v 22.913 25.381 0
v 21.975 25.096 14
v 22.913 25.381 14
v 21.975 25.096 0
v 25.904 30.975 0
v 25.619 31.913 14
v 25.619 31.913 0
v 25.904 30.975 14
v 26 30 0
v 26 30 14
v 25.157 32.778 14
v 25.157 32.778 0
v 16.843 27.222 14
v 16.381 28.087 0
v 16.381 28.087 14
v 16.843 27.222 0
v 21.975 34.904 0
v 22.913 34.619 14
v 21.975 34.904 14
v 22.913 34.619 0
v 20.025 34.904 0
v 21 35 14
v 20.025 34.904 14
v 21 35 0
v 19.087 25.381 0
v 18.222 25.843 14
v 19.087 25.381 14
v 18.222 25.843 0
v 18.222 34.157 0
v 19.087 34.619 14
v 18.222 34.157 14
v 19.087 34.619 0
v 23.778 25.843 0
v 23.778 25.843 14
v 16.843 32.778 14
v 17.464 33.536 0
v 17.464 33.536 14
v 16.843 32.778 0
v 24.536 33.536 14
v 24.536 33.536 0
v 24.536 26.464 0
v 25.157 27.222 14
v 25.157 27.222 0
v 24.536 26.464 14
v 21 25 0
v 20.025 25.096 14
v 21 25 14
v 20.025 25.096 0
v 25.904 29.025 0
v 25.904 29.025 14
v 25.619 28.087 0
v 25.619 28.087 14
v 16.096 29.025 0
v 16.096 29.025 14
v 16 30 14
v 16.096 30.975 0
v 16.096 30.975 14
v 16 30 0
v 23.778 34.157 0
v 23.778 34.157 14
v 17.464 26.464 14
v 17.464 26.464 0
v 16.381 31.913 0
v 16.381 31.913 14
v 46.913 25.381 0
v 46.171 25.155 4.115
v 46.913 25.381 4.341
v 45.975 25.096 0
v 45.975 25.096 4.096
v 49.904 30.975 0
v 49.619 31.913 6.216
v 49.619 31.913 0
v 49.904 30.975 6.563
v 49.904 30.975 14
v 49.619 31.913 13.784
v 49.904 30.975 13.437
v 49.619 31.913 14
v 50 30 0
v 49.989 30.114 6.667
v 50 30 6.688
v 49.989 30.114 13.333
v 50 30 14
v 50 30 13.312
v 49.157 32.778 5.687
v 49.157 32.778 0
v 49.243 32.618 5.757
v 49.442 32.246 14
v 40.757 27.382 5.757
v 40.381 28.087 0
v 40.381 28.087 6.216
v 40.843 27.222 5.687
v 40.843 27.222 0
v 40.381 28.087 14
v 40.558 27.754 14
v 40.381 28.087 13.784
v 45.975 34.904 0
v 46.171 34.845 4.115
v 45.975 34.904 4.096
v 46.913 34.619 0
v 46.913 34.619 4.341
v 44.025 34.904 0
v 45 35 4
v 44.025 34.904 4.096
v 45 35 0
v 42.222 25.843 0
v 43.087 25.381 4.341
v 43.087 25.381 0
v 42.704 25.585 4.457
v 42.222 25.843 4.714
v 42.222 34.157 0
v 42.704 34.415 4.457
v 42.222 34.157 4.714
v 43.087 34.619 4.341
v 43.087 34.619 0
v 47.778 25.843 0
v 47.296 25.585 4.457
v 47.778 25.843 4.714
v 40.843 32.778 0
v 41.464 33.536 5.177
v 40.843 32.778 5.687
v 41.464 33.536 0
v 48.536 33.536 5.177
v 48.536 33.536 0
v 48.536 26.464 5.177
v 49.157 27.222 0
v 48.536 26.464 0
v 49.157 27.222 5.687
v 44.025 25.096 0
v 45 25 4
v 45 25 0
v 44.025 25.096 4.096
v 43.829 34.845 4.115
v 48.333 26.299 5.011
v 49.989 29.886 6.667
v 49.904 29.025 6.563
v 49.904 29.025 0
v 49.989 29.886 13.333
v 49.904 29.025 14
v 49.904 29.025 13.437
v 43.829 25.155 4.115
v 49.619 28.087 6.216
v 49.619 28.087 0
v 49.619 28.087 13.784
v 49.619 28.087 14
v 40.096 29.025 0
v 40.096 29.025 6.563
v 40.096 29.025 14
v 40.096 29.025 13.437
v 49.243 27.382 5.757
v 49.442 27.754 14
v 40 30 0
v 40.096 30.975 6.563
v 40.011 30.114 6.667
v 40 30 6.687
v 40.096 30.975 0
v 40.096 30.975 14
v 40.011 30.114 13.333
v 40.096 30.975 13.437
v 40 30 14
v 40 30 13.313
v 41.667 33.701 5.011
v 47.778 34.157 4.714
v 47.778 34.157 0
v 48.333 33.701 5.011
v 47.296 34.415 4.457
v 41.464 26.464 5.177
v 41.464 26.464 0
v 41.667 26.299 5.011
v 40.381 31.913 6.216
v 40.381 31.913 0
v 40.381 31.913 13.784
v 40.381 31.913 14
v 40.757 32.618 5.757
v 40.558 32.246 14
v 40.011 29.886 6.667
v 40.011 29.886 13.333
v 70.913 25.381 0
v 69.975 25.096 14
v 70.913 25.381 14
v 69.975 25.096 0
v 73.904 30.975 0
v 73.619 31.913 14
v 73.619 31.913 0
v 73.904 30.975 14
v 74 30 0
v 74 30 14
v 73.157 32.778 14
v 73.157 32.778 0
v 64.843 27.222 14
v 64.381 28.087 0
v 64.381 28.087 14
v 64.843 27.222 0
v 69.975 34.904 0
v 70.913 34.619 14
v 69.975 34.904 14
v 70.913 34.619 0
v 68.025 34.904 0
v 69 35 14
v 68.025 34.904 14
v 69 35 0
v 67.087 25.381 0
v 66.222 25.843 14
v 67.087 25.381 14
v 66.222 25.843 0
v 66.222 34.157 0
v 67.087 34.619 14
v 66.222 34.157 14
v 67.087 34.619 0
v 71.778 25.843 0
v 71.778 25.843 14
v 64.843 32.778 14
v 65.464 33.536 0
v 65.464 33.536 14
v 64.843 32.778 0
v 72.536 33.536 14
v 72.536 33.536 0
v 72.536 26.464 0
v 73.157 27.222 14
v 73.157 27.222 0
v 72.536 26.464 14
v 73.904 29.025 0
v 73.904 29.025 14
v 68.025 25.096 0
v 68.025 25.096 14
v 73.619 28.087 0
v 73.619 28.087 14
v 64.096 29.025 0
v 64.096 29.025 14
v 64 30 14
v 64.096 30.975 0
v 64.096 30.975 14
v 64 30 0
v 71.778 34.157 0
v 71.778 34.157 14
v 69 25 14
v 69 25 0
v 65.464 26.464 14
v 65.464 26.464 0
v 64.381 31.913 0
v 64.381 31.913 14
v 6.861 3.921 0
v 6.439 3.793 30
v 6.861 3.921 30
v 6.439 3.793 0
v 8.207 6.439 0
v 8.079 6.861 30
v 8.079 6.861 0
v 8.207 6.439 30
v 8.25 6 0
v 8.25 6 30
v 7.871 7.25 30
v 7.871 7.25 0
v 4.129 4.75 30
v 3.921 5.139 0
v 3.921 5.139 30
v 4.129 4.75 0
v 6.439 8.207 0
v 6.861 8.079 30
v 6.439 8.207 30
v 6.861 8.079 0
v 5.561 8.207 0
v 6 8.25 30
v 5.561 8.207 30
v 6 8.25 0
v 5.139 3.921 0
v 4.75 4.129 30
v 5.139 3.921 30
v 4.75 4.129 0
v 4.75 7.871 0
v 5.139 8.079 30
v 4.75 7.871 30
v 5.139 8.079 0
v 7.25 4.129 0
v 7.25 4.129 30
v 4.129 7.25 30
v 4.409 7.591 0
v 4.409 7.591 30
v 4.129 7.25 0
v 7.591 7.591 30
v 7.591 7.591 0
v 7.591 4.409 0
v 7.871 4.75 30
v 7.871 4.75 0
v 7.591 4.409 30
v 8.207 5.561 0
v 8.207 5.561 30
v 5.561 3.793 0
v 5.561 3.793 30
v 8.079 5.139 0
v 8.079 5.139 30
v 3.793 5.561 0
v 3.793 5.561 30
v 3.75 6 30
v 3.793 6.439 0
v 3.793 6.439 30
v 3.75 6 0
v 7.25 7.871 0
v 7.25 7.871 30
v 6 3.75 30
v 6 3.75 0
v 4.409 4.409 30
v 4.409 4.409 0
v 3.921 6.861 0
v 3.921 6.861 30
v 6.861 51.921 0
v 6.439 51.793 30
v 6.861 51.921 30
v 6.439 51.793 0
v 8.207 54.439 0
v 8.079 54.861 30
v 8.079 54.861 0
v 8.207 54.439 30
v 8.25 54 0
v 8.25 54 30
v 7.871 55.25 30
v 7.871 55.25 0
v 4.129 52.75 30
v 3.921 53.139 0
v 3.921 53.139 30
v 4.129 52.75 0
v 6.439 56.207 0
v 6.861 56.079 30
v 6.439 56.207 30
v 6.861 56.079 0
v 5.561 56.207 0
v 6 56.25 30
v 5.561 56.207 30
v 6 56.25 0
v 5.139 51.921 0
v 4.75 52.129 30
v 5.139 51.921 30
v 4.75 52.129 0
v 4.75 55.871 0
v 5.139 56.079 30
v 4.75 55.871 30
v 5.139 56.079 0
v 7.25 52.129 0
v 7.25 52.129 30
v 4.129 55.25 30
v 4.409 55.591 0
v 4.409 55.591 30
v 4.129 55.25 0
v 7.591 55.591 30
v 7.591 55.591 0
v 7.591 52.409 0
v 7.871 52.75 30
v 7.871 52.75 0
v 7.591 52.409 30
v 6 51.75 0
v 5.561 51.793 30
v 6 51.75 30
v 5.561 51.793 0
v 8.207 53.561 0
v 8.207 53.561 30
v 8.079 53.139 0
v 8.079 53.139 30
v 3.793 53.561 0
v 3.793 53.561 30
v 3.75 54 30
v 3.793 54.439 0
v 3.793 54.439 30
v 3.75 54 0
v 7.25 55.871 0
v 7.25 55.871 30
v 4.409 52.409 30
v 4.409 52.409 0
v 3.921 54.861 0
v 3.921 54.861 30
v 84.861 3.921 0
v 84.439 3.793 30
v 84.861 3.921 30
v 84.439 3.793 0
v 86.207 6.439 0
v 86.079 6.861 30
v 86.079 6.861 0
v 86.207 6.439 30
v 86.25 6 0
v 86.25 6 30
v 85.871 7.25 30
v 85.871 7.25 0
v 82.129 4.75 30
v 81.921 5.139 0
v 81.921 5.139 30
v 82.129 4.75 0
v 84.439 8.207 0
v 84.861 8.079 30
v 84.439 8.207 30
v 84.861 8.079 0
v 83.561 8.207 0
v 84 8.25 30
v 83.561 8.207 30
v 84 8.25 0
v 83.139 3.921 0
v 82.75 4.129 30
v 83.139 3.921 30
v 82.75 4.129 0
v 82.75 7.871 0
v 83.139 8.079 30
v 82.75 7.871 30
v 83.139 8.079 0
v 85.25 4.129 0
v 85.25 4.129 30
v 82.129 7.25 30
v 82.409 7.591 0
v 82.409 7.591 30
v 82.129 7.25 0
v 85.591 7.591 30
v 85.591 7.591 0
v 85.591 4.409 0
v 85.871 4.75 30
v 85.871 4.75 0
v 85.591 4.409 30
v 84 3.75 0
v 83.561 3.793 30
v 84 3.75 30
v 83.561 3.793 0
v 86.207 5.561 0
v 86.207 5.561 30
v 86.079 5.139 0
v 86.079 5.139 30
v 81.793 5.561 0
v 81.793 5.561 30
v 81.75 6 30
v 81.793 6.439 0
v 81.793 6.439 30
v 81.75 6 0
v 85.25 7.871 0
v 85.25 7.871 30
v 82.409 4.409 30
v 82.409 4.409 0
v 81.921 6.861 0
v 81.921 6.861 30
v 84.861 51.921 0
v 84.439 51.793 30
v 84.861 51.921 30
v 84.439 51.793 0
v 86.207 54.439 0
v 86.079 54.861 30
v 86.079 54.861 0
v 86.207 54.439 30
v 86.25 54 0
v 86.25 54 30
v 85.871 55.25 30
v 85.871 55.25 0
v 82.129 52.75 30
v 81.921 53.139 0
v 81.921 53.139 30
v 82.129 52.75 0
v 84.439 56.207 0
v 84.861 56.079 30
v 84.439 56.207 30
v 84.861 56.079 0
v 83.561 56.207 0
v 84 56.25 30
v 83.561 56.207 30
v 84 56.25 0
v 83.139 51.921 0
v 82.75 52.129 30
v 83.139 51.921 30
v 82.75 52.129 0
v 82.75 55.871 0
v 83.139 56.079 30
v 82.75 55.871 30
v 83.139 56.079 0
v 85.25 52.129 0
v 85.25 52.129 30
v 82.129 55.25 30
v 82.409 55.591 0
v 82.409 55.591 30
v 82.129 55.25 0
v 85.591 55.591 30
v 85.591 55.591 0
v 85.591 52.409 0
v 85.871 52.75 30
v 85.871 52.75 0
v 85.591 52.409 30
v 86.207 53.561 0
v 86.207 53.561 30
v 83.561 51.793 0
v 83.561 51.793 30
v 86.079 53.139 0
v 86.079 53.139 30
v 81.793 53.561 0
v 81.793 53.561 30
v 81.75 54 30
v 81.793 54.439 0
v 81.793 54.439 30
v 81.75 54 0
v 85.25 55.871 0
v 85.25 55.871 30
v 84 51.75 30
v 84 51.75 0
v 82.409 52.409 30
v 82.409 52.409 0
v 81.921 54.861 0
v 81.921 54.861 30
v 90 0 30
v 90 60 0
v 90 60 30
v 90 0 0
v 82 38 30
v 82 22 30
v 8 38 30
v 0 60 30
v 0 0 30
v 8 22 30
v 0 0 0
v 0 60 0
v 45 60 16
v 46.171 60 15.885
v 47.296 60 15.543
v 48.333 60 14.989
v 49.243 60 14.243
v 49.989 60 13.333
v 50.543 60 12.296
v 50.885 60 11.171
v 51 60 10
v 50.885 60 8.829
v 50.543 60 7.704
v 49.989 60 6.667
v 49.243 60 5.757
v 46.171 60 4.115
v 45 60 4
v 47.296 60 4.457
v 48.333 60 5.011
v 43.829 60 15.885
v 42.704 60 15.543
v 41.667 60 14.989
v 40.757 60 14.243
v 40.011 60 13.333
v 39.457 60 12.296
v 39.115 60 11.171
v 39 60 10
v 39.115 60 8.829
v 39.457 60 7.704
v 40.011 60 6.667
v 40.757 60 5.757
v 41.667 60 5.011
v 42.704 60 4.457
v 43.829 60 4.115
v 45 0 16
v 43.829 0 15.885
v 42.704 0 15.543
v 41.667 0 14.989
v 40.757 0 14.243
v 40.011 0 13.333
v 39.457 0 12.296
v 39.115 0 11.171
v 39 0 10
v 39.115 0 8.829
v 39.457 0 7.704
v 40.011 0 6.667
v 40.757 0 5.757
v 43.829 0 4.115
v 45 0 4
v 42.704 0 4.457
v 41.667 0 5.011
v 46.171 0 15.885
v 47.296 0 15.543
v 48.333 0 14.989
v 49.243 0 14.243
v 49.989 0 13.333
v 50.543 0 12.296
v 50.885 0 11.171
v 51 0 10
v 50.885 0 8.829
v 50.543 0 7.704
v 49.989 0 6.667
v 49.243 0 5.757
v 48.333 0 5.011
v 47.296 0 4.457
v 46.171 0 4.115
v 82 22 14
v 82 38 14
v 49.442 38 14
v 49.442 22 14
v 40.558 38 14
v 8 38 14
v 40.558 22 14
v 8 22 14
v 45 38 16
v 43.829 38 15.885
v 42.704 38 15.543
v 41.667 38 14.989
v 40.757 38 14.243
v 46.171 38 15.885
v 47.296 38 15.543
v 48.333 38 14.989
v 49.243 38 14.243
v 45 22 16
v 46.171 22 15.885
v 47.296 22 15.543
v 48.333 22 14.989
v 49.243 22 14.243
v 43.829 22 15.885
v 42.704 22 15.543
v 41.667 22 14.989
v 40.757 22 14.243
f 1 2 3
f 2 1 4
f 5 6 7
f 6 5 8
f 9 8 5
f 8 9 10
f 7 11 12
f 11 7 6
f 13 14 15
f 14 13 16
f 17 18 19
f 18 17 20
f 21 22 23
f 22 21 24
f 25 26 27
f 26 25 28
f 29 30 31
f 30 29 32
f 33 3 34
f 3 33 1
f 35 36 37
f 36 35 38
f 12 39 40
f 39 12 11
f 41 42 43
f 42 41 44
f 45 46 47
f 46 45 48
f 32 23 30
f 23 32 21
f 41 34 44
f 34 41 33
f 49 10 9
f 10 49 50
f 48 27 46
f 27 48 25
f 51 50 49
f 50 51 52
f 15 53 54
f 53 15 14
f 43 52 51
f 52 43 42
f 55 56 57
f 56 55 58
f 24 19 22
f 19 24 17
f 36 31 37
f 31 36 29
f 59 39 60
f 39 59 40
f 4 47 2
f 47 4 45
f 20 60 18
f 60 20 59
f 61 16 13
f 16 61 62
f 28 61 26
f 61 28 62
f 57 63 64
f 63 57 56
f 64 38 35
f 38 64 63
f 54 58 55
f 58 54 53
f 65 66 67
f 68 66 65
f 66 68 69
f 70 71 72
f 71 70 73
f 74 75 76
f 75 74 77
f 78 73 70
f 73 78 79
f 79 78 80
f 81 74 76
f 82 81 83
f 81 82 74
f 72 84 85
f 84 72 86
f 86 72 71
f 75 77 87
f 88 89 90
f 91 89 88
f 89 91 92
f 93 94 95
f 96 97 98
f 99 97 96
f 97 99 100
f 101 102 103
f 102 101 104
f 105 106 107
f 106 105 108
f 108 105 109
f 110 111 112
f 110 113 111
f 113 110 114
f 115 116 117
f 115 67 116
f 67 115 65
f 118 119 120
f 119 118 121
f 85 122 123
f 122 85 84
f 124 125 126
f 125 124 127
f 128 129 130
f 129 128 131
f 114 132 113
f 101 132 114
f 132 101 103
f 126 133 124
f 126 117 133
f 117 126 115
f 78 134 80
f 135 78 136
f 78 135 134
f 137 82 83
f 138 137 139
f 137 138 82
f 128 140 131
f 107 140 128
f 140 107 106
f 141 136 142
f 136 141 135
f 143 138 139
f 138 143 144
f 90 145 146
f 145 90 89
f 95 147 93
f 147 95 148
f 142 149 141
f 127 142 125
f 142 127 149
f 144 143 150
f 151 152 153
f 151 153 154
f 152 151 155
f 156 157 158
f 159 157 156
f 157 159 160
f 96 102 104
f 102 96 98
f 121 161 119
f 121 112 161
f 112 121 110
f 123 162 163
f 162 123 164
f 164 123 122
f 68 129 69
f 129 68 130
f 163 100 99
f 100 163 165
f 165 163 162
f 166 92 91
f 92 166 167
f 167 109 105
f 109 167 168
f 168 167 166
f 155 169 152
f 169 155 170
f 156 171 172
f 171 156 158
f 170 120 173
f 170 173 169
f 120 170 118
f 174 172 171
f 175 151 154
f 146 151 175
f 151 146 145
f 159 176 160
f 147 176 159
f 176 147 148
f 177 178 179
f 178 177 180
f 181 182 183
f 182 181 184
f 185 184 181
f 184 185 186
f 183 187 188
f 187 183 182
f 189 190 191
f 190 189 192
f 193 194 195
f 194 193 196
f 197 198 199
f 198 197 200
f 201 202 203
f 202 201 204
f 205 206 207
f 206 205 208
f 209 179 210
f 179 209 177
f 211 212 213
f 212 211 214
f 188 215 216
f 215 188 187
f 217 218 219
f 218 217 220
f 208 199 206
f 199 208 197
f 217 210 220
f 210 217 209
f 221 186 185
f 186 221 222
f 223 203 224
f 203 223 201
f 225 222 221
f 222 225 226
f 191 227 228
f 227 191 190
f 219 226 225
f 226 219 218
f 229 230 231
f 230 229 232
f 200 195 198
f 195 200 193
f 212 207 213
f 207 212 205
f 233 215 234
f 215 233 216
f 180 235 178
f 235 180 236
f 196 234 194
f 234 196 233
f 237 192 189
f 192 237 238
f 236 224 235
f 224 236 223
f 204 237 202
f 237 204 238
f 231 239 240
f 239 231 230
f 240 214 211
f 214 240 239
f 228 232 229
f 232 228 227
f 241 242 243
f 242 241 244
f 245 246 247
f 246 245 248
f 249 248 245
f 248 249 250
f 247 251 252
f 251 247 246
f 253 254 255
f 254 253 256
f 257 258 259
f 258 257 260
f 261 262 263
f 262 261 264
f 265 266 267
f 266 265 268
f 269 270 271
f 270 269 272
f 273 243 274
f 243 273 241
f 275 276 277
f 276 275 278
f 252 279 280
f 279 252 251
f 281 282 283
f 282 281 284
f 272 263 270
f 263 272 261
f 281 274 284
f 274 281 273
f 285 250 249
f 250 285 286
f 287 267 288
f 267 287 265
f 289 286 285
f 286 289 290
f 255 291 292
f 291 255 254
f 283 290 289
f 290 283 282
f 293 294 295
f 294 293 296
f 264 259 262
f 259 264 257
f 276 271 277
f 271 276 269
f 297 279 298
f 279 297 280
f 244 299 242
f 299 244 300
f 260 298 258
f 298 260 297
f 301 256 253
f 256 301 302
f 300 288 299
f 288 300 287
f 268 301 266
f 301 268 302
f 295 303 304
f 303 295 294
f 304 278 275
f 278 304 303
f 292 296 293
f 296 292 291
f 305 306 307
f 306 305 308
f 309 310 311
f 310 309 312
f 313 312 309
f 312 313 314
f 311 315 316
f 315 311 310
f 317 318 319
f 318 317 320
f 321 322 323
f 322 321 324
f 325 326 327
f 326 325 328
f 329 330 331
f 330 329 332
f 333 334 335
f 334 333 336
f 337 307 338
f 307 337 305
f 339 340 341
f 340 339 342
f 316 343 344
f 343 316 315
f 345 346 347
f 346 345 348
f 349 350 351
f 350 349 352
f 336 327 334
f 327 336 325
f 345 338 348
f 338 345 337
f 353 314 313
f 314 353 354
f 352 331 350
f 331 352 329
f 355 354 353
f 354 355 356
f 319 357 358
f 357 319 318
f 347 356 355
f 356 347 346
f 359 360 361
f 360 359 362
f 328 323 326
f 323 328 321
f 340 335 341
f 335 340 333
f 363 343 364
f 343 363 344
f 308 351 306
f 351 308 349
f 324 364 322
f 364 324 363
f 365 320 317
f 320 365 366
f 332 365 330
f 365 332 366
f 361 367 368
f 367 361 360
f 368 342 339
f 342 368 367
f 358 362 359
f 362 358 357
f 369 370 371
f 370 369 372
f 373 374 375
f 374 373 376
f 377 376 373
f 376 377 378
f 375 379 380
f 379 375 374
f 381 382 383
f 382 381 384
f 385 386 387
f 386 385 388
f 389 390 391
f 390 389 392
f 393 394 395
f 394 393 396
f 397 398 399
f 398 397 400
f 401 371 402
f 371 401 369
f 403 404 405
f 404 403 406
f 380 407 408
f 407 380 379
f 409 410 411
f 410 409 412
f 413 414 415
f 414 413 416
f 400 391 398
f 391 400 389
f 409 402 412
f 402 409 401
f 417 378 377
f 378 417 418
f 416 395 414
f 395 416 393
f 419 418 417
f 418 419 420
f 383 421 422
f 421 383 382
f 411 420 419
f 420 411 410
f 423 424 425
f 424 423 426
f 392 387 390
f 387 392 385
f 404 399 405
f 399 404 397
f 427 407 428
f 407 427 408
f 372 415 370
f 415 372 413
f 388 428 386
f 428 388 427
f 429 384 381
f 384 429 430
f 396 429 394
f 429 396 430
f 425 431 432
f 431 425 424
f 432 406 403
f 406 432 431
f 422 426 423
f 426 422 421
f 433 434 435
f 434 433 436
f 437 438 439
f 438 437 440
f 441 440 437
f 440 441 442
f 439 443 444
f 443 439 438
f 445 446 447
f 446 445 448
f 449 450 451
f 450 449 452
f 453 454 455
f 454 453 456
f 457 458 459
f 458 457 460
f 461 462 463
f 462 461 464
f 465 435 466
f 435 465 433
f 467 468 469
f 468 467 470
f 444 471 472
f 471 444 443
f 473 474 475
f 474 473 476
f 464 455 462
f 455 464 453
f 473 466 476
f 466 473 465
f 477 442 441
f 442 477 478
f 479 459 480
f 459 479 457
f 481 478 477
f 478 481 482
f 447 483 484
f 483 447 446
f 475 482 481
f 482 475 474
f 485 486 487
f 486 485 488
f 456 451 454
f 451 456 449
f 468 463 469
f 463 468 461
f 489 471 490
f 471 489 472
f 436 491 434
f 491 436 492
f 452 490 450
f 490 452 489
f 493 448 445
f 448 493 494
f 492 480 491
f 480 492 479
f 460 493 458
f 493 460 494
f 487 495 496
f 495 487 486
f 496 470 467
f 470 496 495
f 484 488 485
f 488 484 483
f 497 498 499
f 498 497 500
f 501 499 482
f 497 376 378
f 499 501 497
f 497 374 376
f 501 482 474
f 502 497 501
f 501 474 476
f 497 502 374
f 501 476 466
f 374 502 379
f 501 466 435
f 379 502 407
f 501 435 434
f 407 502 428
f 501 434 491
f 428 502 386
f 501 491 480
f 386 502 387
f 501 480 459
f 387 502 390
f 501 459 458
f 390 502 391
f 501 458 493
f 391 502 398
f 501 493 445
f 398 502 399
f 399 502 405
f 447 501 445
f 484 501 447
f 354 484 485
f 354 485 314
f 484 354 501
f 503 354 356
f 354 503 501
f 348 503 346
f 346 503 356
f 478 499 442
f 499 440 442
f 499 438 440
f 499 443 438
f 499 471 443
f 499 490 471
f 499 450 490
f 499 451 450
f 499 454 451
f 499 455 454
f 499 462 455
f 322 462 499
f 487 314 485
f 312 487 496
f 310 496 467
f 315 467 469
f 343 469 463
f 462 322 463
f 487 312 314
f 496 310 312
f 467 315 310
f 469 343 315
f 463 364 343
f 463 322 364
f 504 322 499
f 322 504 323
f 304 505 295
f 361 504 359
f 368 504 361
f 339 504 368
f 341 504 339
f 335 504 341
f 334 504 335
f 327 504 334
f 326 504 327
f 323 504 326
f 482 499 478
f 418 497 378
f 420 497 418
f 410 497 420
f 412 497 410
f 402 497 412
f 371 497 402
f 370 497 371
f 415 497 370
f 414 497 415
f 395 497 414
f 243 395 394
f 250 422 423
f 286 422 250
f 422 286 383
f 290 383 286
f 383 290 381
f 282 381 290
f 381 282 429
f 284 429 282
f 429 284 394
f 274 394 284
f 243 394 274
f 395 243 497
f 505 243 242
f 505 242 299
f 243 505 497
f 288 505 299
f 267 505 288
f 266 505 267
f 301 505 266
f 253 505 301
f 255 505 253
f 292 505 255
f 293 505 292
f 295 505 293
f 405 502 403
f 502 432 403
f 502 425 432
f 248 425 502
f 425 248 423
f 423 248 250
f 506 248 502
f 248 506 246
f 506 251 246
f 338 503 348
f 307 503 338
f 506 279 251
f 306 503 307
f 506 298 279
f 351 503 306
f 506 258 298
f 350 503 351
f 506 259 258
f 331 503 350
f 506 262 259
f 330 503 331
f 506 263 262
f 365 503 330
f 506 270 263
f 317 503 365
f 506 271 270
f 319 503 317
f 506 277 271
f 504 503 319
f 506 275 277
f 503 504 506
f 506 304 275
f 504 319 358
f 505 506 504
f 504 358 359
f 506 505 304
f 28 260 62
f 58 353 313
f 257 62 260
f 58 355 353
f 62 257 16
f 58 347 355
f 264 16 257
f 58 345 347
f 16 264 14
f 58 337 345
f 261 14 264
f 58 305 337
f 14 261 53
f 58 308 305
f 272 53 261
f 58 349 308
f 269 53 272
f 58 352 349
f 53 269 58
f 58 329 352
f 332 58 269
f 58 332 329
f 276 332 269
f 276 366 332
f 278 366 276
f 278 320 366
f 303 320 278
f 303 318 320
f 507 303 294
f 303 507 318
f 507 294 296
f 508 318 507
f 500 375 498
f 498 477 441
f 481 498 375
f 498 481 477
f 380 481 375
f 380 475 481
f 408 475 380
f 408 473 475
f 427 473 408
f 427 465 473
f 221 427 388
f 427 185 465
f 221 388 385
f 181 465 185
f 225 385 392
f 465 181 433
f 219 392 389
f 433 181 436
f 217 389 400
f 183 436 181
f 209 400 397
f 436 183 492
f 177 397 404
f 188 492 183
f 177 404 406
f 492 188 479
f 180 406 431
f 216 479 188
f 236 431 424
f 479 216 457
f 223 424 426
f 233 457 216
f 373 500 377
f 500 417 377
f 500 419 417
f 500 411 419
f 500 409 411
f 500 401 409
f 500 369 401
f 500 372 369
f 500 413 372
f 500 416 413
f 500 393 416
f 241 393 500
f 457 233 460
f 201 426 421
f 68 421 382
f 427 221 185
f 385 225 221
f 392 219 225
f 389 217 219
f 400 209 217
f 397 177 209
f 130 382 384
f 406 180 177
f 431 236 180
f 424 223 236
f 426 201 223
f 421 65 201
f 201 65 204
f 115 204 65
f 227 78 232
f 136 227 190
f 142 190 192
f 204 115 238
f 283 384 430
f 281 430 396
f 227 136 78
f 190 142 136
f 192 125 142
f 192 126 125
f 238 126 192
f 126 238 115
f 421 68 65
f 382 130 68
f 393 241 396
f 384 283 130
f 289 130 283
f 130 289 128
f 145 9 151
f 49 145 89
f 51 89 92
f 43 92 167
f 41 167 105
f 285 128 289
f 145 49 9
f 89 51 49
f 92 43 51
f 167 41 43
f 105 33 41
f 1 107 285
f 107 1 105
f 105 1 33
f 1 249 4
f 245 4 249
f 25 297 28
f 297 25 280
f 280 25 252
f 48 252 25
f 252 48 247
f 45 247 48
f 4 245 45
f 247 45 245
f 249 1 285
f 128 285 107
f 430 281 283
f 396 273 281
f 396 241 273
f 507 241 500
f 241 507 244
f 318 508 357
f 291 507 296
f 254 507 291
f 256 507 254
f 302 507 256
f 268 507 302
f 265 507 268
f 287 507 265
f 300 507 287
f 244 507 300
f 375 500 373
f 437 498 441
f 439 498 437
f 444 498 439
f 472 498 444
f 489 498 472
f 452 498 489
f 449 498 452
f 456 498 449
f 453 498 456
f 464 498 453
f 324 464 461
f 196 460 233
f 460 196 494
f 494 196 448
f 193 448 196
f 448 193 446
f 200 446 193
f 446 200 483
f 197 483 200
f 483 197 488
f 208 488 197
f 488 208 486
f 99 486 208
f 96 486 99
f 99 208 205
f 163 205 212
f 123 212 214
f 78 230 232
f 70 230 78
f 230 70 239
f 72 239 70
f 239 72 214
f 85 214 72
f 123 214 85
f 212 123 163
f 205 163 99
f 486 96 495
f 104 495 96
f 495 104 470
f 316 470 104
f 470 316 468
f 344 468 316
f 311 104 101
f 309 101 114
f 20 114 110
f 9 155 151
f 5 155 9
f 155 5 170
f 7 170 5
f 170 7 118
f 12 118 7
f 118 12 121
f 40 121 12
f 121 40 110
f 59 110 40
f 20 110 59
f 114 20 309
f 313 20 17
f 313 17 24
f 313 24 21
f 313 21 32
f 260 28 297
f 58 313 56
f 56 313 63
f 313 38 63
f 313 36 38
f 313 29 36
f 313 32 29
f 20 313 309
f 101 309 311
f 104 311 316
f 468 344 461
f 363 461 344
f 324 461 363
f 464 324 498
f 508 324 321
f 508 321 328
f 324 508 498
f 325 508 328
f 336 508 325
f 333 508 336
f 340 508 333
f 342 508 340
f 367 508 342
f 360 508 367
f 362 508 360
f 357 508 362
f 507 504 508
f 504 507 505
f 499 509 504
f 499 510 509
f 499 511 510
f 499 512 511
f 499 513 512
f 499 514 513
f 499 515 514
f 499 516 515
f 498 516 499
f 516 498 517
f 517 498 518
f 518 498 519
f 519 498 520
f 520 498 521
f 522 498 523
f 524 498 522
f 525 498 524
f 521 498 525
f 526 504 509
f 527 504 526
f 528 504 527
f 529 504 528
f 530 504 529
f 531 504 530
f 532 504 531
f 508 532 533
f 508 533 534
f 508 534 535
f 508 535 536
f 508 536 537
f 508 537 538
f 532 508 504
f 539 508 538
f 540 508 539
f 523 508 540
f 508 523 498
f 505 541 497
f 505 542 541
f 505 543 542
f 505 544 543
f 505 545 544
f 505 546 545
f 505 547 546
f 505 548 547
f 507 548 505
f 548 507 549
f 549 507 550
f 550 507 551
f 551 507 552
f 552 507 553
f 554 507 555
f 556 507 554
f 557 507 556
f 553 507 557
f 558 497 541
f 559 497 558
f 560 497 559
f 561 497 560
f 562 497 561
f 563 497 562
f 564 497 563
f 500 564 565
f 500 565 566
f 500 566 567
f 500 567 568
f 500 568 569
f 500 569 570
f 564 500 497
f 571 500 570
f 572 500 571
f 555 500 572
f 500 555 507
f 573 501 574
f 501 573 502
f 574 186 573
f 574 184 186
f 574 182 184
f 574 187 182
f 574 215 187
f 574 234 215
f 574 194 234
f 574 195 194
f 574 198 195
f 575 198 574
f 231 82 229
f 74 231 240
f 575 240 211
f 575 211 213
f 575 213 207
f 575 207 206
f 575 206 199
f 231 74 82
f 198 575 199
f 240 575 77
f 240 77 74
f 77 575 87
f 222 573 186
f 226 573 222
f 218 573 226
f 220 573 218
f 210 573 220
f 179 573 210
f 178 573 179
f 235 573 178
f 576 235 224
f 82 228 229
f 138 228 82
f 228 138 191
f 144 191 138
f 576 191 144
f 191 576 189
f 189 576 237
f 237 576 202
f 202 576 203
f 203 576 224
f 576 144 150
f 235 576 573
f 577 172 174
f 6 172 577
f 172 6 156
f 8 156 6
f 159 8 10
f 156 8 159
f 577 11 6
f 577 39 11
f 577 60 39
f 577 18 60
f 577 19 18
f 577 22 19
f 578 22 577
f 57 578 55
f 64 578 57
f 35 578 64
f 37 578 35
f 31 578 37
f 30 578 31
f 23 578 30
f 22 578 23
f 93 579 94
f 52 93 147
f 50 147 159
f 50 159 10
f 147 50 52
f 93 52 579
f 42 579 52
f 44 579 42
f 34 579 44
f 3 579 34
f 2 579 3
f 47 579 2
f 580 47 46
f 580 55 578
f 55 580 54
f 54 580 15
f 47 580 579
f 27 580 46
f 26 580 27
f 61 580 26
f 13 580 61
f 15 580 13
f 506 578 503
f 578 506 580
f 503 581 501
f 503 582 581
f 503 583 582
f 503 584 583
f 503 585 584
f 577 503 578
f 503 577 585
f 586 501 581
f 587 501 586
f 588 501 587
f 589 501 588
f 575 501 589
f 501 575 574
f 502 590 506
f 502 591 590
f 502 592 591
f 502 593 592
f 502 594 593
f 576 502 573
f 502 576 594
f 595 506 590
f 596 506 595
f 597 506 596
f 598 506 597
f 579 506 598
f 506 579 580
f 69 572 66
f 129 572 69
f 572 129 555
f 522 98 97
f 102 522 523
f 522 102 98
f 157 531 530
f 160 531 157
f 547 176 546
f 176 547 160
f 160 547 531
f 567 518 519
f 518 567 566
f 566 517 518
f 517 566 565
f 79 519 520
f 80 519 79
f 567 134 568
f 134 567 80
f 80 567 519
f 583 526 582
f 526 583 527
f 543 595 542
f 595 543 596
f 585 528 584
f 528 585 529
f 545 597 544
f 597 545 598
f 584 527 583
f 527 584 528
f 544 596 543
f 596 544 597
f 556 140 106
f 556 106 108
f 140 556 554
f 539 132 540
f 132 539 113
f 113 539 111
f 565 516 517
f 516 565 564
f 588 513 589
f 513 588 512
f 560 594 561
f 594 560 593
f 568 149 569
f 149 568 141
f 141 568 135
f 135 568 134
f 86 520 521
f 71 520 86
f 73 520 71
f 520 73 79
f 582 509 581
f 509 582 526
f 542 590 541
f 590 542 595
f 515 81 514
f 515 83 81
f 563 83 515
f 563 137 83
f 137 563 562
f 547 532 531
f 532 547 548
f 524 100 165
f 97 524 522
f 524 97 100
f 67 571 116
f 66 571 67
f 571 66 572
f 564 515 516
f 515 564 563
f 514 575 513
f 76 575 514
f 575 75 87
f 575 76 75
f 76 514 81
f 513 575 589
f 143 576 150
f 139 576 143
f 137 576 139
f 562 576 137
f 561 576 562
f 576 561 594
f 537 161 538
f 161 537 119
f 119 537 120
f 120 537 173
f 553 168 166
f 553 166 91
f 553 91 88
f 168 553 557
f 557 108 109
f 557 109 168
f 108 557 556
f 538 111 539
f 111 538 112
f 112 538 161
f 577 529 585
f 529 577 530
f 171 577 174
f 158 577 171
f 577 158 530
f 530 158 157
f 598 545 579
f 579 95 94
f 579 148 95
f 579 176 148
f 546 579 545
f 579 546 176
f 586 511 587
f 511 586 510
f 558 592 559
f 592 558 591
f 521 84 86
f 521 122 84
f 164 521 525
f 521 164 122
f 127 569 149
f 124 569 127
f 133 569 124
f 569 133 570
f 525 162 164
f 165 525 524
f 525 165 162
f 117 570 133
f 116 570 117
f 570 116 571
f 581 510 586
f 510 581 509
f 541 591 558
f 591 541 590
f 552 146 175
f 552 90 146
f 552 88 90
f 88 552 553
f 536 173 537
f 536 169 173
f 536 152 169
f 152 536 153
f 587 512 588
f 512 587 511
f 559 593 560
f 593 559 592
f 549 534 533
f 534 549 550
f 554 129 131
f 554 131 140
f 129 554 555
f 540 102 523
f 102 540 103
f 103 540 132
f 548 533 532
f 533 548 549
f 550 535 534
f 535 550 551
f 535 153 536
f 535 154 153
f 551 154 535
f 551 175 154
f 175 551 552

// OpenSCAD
$fn = 32;

// ----------------------------------------------------------------------
// Manifold block: side_outlet manifold
// ----------------------------------------------------------------------

// --- parameters (mm) ---
block_l = 90;             // block length, X
block_w = 60;             // block width, Y
block_h = 30;             // block height, Z
port_d = 10;              // port bore diameter
port_pitch = 24;          // port pitch along X
gallery_d = 16;           // top gallery width, Y
gallery_depth = 16;       // gallery pocket depth
wall_p = 8;               // gallery end wall thickness, X
mnt_d = 4.5;              // mounting hole diameter
mnt_in = 6;               // mounting hole inset from the edges
out_d = 12;               // outlet bore diameter
out_z = 10;               // outlet axis height

n_ports = 3;  // ports in the row
port_x0 = (block_l - (n_ports - 1) * port_pitch) / 2;  // first port X

difference() {
  cube([block_l, block_w, block_h]);
  for (i = [0 : n_ports - 1])
    translate([port_x0 + i * port_pitch, block_w / 2, -1])
      cylinder(h = block_h + 2, d = port_d);
  translate([wall_p, block_w / 2 - gallery_d / 2, block_h - gallery_depth])
    cube([block_l - 2 * wall_p, gallery_d, gallery_depth + 1]);
  for (cx = [mnt_in, block_l - mnt_in])
    for (cy = [mnt_in, block_w - mnt_in])
      translate([cx, cy, -1]) cylinder(h = block_h + 2, d = mnt_d);
  translate([block_l / 2, -1, out_z]) rotate([-90, 0, 0])
    cylinder(h = block_w + 2, d = out_d);
}
